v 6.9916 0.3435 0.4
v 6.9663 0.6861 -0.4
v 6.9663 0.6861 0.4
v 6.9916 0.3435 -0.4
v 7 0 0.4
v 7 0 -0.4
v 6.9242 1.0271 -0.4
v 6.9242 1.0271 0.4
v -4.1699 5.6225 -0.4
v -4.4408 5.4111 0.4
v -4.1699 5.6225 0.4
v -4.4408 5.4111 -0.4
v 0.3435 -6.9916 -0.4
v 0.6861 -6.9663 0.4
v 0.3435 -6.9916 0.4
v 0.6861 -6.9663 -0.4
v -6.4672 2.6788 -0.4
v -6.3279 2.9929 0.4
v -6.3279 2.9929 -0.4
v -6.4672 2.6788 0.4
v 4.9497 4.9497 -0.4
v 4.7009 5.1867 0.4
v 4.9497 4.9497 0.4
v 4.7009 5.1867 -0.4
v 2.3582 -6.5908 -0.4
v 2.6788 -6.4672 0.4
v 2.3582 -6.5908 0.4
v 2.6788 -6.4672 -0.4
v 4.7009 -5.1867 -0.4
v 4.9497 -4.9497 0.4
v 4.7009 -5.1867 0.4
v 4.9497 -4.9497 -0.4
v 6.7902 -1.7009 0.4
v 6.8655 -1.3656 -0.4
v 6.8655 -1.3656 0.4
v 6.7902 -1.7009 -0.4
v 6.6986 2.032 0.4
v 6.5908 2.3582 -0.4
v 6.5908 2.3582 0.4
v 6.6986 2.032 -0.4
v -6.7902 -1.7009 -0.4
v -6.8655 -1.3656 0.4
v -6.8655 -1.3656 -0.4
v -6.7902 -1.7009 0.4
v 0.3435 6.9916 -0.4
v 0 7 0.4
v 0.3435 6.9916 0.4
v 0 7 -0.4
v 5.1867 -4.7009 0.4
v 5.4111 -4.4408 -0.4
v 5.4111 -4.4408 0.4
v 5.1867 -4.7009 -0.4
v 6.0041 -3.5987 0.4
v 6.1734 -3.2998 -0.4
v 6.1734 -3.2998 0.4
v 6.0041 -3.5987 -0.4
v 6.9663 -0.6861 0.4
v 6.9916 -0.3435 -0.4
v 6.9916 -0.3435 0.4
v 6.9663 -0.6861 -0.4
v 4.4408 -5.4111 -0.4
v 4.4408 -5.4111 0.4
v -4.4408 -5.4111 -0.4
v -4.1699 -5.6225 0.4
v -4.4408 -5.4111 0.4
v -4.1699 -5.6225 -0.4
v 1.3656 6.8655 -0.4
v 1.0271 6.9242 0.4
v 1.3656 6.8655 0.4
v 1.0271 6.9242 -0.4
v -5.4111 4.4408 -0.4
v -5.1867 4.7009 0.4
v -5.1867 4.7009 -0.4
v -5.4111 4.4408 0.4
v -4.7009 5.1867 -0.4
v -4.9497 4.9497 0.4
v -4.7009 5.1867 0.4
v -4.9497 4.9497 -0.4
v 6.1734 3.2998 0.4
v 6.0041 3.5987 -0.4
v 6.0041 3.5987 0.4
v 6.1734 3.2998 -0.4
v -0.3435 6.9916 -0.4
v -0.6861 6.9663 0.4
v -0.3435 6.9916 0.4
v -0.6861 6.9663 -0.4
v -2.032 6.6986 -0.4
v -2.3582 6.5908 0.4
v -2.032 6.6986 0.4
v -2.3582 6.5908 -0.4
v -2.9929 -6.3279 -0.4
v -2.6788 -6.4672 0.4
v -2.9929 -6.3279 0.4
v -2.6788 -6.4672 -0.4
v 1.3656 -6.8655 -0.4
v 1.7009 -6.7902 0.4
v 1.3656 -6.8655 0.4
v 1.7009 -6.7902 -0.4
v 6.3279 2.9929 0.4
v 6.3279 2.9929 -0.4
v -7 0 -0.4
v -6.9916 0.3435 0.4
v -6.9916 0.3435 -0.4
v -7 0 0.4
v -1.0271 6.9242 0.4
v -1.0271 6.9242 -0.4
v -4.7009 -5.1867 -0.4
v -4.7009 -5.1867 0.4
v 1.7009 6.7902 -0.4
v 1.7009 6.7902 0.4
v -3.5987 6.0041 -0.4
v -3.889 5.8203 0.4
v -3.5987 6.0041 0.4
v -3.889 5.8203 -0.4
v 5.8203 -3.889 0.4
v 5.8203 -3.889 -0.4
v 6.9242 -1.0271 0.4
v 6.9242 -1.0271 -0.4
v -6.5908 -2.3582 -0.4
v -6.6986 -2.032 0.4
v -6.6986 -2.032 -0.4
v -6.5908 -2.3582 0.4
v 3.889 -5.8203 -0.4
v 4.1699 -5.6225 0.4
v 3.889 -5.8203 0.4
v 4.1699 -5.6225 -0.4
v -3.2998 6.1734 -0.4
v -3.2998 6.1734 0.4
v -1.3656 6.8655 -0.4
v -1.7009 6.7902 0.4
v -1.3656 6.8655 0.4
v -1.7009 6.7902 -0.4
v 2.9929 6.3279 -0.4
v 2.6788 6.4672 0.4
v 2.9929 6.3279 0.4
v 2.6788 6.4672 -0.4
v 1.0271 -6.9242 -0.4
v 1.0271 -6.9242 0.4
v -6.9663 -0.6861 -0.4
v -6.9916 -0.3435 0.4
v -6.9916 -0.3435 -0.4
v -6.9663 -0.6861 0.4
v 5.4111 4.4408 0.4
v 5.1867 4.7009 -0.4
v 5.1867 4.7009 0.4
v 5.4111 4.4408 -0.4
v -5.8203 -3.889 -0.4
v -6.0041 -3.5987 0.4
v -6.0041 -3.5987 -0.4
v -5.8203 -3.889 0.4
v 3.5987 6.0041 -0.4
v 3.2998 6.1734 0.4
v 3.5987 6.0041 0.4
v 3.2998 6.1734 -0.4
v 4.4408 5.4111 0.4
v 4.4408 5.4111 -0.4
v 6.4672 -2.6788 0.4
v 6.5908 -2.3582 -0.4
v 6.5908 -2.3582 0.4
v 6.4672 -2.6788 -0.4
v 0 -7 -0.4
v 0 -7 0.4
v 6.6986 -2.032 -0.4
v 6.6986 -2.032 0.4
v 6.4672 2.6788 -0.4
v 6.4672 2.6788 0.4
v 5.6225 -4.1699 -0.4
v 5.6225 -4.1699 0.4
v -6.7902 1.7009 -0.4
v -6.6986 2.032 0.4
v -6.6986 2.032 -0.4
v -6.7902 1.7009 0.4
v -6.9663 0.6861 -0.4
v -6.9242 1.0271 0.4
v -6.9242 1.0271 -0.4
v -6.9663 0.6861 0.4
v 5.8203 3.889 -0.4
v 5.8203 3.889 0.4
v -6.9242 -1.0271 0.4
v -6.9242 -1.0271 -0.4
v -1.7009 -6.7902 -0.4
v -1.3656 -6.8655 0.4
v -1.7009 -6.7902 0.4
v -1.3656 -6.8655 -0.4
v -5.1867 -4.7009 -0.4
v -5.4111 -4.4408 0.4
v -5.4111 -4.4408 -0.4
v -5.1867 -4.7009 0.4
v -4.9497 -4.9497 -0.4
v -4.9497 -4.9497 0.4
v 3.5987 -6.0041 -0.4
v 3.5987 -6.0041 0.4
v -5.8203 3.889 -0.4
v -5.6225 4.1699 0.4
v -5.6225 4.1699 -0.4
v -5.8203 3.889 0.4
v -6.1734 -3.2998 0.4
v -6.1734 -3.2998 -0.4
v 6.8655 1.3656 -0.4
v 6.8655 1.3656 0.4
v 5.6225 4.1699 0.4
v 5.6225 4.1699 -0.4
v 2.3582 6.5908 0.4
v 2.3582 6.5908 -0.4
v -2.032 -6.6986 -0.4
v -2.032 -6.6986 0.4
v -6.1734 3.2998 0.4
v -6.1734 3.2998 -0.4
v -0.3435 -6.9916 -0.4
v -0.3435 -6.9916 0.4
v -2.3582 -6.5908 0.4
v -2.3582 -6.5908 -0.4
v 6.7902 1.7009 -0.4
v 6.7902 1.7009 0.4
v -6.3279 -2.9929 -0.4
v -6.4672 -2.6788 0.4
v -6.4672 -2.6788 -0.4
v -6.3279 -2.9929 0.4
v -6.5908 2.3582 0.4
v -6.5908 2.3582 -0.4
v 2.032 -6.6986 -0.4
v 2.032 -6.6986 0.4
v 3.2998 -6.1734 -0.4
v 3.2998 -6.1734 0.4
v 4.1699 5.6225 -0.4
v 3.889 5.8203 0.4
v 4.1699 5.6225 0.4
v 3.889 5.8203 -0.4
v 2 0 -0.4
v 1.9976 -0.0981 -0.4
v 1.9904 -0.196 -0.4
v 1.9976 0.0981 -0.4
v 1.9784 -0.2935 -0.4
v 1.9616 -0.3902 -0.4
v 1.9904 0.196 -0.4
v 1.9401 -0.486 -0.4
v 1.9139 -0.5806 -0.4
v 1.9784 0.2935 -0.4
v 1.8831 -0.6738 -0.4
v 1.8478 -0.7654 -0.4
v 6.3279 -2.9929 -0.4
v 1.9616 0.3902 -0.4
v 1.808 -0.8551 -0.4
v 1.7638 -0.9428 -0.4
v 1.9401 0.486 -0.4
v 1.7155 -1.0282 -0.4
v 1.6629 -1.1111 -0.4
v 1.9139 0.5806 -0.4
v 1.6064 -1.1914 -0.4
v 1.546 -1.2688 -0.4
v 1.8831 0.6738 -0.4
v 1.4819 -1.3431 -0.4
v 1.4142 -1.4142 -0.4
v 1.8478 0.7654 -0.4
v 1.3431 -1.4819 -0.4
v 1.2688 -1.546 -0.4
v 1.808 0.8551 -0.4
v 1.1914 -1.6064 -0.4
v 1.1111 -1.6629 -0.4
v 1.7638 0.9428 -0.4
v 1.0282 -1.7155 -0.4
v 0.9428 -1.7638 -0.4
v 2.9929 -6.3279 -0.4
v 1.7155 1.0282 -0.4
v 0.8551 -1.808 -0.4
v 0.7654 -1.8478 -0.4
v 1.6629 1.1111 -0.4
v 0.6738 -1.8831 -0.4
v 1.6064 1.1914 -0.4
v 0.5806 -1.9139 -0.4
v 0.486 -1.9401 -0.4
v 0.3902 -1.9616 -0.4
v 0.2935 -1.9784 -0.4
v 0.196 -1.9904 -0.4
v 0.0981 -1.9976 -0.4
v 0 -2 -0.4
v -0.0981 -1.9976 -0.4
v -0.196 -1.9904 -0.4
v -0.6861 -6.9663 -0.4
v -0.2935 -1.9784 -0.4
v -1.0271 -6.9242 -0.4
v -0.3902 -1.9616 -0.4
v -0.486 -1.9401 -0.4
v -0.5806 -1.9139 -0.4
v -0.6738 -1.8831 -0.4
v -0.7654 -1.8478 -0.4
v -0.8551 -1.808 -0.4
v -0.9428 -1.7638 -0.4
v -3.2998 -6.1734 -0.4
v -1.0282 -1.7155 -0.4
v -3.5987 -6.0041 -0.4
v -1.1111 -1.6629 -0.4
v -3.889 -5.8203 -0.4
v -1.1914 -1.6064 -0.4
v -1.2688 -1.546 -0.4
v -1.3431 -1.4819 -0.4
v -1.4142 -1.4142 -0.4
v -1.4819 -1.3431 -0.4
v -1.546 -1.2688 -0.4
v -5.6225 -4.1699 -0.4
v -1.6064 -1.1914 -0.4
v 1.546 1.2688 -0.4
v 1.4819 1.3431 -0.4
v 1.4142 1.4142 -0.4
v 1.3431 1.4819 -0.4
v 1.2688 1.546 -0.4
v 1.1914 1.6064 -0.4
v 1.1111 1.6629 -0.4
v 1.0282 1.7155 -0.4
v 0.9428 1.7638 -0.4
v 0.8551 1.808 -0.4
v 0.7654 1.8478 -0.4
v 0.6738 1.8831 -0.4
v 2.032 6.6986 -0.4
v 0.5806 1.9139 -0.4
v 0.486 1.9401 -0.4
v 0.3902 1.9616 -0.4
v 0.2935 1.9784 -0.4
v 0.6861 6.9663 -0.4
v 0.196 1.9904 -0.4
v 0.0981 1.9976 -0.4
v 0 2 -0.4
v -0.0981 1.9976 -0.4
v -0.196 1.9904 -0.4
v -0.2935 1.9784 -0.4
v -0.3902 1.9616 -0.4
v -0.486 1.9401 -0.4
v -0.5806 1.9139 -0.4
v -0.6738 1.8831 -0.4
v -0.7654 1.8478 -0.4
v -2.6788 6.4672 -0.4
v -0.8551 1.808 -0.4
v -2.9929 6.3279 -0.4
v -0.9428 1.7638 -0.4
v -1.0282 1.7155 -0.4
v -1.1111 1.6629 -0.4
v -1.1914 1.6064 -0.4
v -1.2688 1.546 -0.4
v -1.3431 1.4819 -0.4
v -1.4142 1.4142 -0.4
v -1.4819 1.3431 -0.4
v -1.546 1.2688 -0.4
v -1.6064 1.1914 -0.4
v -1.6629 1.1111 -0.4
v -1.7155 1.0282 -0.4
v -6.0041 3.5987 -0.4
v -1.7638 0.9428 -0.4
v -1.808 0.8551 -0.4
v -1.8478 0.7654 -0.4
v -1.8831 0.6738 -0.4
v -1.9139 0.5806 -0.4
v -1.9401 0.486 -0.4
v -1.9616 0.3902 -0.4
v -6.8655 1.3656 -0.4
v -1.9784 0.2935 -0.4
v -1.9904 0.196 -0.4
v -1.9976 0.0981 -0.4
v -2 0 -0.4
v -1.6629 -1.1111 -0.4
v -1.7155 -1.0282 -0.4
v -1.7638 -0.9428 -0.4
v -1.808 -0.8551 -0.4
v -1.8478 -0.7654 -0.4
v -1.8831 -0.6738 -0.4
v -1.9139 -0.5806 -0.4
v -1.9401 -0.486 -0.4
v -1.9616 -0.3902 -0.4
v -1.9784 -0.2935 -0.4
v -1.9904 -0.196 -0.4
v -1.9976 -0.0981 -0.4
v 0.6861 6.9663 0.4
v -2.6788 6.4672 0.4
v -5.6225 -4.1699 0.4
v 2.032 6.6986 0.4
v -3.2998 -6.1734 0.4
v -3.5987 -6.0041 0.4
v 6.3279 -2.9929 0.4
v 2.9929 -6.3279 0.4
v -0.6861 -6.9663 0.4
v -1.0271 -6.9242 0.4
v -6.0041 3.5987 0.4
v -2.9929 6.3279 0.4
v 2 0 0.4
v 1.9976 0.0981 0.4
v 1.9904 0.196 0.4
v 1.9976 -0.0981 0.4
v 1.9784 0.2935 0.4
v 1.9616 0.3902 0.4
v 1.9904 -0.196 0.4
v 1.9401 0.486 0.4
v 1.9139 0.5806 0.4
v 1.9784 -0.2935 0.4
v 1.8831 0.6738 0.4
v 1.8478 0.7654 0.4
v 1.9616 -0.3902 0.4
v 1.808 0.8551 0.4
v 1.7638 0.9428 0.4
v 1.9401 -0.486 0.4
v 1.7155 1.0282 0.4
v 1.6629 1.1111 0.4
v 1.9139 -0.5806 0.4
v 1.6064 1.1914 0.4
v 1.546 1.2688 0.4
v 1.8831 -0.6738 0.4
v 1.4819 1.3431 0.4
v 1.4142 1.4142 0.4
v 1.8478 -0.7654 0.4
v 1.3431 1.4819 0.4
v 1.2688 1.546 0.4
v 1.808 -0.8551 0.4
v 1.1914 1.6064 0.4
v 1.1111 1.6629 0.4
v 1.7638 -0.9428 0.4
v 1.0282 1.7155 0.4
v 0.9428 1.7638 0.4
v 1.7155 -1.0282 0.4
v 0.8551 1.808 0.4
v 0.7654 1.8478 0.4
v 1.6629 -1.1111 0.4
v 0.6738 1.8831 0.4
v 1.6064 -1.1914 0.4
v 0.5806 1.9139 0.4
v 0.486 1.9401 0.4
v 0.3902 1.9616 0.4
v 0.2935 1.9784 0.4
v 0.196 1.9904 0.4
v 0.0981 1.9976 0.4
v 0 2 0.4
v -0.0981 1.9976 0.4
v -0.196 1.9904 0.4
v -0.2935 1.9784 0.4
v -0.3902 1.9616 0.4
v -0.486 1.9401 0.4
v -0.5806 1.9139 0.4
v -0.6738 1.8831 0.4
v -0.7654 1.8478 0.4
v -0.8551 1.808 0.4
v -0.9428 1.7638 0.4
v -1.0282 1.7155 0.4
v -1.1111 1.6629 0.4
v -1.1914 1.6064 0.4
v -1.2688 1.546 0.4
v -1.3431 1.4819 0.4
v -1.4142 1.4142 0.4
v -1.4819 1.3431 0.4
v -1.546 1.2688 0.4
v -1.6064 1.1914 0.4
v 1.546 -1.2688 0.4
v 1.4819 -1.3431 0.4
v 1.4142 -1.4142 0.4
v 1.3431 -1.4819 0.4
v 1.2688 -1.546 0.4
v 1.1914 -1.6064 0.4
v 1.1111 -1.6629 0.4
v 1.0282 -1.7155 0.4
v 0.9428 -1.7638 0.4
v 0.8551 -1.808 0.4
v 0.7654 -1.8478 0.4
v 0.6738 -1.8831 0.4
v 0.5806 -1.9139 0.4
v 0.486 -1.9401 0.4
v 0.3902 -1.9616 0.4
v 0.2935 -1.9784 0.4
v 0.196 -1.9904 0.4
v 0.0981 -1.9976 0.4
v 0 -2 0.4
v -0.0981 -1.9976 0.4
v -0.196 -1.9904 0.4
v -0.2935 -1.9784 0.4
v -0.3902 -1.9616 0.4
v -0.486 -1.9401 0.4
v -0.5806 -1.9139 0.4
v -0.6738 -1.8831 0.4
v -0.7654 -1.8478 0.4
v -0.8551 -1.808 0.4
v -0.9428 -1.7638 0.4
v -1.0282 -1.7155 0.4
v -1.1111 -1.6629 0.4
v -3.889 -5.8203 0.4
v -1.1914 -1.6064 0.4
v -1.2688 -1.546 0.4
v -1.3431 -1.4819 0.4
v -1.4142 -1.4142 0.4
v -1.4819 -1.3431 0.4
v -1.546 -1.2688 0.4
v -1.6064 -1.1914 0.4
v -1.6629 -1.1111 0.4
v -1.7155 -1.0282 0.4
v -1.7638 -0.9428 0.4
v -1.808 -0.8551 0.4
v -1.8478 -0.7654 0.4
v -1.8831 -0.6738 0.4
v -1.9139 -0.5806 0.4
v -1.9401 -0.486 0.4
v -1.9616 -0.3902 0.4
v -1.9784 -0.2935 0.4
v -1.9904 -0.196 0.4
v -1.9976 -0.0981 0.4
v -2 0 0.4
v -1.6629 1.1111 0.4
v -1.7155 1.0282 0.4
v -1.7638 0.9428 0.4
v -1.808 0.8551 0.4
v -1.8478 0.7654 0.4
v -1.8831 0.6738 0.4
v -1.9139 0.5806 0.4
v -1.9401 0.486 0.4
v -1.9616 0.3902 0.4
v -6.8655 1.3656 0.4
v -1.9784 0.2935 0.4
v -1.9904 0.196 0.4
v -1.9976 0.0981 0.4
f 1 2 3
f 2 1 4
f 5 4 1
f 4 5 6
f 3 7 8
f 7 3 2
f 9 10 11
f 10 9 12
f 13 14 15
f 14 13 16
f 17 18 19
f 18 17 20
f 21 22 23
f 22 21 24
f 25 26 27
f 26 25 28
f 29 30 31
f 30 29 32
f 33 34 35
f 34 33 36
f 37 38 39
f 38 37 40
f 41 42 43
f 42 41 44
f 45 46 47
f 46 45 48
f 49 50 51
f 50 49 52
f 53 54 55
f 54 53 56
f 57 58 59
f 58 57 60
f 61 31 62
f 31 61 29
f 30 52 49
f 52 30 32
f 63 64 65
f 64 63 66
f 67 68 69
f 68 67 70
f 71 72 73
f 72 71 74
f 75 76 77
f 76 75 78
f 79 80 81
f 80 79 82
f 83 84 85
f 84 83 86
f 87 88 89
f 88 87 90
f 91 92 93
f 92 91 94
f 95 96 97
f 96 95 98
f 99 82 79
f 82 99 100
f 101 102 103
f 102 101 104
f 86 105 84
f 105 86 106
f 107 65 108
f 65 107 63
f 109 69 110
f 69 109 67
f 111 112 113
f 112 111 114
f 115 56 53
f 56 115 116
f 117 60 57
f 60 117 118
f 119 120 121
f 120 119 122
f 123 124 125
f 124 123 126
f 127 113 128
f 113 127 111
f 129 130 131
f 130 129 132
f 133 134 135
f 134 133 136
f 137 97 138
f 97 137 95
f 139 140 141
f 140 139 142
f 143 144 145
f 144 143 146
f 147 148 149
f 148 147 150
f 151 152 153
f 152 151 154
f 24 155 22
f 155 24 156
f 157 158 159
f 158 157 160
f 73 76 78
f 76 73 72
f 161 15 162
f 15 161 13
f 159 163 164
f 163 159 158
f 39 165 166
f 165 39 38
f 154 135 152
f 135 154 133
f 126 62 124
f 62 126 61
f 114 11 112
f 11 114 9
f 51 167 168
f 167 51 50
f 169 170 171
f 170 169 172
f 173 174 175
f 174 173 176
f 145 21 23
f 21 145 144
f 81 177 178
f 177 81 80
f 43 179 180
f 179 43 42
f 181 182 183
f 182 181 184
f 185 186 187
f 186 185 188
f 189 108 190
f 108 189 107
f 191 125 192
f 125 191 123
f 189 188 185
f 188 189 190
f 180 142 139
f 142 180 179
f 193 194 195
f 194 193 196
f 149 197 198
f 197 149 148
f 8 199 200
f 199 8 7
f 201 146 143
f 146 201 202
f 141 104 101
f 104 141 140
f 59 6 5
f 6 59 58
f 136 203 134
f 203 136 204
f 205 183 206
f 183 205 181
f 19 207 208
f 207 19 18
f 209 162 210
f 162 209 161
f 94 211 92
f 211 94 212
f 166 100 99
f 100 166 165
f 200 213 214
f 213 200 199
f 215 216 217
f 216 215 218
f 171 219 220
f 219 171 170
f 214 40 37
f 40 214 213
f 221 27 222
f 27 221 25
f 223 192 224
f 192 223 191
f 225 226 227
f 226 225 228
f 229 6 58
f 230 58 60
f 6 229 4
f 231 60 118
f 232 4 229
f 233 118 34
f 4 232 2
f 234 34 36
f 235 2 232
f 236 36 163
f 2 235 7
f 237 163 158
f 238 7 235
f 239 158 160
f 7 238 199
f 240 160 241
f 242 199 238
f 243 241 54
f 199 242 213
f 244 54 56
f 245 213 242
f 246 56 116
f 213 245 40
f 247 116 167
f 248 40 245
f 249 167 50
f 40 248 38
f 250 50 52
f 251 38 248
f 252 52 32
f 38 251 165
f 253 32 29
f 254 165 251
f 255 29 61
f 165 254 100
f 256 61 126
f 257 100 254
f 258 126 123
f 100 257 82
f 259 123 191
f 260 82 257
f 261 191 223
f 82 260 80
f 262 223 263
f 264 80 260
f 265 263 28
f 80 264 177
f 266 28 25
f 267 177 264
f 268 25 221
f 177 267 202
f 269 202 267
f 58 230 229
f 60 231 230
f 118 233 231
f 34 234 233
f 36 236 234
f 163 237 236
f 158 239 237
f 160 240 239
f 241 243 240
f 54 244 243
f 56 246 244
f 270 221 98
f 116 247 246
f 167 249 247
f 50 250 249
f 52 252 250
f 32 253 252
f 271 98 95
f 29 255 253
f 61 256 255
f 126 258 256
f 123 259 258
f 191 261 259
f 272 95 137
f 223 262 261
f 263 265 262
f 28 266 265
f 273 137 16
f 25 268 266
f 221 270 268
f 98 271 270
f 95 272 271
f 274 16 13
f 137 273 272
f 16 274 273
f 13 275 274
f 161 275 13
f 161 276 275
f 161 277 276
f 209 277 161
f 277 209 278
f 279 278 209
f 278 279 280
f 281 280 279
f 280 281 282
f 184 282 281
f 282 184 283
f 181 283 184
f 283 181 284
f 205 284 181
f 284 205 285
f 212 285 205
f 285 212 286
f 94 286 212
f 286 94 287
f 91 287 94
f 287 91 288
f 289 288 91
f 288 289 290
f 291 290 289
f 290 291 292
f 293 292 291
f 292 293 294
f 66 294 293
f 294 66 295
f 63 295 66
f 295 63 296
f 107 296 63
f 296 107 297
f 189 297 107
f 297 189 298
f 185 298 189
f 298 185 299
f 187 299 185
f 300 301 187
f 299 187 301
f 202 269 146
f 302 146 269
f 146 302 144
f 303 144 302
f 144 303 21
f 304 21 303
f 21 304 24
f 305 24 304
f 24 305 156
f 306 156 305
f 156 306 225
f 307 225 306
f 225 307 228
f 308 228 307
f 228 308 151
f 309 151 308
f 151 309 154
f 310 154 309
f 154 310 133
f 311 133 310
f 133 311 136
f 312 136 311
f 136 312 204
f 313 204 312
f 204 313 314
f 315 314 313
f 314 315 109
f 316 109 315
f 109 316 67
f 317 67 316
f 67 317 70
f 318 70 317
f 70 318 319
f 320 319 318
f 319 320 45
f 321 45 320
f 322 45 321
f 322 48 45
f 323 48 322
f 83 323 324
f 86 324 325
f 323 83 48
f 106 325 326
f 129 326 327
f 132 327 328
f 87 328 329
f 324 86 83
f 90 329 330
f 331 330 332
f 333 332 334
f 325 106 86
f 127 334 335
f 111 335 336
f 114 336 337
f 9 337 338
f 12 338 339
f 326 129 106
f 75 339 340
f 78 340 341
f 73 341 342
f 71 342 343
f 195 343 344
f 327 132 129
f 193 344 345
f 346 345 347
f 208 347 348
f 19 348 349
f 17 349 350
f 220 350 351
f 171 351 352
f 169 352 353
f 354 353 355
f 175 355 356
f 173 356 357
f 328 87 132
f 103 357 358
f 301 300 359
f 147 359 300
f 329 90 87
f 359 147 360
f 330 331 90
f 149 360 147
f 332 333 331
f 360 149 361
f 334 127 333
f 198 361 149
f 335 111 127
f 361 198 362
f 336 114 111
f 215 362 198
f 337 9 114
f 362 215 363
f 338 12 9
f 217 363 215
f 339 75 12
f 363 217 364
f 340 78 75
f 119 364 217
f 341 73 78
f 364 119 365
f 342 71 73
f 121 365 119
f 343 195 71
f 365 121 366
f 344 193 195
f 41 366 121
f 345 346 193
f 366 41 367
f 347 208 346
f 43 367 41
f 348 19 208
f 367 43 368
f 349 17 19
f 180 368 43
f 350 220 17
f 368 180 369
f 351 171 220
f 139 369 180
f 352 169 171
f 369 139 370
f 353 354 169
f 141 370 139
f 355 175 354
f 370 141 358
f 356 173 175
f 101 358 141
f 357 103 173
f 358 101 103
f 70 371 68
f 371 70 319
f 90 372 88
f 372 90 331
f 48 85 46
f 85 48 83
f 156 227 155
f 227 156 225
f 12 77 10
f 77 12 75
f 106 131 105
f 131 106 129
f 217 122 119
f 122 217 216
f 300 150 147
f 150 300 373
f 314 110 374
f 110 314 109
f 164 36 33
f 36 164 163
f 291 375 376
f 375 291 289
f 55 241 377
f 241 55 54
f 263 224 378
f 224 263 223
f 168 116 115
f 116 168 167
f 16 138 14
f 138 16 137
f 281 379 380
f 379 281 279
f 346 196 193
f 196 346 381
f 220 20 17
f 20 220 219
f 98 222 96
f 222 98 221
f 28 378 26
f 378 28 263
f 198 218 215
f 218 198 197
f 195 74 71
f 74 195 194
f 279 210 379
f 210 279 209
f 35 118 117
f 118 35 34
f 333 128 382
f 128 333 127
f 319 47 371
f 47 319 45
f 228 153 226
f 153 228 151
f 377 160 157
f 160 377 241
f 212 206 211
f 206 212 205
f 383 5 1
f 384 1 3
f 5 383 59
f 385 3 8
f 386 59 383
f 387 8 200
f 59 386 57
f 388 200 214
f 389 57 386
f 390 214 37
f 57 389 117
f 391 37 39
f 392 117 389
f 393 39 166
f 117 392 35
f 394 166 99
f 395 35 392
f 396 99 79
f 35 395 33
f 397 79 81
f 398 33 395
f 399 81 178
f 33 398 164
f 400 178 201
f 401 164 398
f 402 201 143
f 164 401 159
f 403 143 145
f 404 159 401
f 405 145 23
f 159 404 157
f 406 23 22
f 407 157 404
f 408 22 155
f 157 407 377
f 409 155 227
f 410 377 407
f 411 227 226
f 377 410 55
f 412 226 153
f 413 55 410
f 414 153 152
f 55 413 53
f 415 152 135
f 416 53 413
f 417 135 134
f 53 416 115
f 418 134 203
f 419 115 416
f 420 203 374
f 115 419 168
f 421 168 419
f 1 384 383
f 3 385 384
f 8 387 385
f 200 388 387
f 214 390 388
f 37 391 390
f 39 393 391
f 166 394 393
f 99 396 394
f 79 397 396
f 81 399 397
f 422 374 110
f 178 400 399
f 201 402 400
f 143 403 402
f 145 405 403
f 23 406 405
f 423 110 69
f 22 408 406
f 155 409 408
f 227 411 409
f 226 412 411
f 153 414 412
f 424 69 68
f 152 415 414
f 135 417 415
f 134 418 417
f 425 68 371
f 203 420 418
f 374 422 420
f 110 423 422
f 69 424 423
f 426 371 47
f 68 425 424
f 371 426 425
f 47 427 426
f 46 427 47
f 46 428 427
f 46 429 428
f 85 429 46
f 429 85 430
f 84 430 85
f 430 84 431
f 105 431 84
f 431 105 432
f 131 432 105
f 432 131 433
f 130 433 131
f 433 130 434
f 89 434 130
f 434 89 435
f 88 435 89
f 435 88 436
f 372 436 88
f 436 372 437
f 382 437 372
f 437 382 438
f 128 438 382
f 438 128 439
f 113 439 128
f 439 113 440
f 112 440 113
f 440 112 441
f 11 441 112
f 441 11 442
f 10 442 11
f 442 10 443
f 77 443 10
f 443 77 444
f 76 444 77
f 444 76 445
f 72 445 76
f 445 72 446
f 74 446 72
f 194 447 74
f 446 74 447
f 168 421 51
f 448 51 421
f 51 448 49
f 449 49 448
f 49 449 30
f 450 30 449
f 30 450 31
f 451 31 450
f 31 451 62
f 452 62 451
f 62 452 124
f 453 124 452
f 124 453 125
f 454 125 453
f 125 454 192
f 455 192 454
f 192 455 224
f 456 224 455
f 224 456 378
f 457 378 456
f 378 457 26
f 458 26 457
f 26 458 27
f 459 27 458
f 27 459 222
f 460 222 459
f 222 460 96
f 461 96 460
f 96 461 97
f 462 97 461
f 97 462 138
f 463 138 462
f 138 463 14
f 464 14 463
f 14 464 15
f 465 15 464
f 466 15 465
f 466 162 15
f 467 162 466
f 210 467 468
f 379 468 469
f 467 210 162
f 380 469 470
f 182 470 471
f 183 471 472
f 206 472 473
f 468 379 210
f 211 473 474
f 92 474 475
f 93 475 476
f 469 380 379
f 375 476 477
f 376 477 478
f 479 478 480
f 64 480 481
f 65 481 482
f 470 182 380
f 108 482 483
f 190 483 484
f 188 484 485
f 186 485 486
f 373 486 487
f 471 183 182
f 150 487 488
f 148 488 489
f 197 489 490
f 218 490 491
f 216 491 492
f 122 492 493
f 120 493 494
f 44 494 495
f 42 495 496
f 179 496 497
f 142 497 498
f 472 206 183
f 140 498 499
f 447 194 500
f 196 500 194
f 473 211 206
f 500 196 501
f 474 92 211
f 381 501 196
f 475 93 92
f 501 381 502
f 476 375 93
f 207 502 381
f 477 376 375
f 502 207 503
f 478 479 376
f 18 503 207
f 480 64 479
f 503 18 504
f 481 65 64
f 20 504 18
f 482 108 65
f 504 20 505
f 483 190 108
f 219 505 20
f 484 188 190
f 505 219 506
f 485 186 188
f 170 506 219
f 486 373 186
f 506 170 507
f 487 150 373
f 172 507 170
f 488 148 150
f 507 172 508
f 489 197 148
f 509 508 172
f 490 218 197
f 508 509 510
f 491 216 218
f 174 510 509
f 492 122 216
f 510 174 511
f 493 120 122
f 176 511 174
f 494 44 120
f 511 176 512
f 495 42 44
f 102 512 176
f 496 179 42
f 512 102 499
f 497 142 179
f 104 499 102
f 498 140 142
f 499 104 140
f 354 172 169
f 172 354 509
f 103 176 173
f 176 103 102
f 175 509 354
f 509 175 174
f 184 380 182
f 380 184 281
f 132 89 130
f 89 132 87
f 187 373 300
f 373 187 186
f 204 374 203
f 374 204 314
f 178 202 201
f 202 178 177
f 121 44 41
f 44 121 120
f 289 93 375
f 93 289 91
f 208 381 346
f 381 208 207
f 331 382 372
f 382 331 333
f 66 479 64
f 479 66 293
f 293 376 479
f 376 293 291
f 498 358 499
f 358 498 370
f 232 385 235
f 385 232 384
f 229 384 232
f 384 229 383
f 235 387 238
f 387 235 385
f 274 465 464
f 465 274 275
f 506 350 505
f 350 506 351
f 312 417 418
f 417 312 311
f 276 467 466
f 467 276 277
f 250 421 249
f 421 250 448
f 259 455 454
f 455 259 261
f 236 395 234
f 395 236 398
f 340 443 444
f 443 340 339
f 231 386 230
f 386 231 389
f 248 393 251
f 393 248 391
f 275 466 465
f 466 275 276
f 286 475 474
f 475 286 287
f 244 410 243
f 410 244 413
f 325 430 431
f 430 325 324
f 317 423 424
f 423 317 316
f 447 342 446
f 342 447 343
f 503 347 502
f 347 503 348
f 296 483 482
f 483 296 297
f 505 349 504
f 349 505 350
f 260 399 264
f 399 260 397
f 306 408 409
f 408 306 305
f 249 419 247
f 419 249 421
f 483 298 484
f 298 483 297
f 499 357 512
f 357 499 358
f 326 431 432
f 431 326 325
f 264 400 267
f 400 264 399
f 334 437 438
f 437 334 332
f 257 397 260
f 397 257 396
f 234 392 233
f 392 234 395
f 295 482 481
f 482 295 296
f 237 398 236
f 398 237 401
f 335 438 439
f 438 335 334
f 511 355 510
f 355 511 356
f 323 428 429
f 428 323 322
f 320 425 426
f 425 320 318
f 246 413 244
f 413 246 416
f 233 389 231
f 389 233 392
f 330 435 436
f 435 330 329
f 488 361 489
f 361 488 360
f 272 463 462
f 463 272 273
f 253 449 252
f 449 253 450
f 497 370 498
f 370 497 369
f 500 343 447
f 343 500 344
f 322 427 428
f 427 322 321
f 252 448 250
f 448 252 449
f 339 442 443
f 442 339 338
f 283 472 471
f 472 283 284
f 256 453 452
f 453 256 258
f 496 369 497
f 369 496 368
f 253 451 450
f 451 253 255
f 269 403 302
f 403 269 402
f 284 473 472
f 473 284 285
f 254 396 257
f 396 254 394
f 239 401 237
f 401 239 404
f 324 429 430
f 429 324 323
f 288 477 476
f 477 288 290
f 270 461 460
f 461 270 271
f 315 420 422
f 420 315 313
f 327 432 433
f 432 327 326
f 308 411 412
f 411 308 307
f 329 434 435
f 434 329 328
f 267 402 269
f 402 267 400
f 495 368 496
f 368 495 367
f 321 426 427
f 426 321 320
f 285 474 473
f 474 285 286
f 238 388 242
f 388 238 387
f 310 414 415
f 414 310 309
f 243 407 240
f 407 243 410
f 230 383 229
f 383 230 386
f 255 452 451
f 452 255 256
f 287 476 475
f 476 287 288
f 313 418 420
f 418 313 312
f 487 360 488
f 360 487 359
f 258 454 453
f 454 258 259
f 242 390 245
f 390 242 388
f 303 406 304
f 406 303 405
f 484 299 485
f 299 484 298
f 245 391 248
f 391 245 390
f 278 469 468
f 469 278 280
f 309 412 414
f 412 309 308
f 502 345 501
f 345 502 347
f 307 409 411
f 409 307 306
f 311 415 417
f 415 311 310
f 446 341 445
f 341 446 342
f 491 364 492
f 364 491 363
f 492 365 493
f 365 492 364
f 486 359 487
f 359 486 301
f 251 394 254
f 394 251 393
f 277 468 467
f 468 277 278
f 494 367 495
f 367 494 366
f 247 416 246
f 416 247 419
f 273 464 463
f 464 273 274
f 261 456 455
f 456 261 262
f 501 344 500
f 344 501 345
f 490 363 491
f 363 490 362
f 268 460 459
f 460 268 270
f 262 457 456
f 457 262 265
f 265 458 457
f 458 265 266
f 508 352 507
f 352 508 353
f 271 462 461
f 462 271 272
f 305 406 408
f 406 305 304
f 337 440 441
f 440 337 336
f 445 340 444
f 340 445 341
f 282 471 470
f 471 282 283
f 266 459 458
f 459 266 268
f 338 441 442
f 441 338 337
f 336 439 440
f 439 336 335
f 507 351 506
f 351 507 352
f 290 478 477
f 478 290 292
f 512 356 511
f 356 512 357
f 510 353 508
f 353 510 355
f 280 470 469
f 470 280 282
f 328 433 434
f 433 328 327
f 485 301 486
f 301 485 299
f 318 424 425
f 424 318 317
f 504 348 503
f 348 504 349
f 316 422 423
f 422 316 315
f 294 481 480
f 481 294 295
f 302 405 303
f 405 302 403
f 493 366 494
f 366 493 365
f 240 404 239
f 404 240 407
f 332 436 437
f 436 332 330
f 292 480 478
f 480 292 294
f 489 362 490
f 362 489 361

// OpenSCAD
// Penny washer (single part)
// 4.0mm inner hole, 14.0mm outer diameter, 0.8mm thickness

inner_diameter_mm = 4.0;
outer_diameter_mm = 14.0;
thickness_mm      = 0.8;

$fn = 128;

difference() {
    cylinder(d = outer_diameter_mm, h = thickness_mm, center = true);
    cylinder(d = inner_diameter_mm, h = thickness_mm + 0.2, center = true);
}
